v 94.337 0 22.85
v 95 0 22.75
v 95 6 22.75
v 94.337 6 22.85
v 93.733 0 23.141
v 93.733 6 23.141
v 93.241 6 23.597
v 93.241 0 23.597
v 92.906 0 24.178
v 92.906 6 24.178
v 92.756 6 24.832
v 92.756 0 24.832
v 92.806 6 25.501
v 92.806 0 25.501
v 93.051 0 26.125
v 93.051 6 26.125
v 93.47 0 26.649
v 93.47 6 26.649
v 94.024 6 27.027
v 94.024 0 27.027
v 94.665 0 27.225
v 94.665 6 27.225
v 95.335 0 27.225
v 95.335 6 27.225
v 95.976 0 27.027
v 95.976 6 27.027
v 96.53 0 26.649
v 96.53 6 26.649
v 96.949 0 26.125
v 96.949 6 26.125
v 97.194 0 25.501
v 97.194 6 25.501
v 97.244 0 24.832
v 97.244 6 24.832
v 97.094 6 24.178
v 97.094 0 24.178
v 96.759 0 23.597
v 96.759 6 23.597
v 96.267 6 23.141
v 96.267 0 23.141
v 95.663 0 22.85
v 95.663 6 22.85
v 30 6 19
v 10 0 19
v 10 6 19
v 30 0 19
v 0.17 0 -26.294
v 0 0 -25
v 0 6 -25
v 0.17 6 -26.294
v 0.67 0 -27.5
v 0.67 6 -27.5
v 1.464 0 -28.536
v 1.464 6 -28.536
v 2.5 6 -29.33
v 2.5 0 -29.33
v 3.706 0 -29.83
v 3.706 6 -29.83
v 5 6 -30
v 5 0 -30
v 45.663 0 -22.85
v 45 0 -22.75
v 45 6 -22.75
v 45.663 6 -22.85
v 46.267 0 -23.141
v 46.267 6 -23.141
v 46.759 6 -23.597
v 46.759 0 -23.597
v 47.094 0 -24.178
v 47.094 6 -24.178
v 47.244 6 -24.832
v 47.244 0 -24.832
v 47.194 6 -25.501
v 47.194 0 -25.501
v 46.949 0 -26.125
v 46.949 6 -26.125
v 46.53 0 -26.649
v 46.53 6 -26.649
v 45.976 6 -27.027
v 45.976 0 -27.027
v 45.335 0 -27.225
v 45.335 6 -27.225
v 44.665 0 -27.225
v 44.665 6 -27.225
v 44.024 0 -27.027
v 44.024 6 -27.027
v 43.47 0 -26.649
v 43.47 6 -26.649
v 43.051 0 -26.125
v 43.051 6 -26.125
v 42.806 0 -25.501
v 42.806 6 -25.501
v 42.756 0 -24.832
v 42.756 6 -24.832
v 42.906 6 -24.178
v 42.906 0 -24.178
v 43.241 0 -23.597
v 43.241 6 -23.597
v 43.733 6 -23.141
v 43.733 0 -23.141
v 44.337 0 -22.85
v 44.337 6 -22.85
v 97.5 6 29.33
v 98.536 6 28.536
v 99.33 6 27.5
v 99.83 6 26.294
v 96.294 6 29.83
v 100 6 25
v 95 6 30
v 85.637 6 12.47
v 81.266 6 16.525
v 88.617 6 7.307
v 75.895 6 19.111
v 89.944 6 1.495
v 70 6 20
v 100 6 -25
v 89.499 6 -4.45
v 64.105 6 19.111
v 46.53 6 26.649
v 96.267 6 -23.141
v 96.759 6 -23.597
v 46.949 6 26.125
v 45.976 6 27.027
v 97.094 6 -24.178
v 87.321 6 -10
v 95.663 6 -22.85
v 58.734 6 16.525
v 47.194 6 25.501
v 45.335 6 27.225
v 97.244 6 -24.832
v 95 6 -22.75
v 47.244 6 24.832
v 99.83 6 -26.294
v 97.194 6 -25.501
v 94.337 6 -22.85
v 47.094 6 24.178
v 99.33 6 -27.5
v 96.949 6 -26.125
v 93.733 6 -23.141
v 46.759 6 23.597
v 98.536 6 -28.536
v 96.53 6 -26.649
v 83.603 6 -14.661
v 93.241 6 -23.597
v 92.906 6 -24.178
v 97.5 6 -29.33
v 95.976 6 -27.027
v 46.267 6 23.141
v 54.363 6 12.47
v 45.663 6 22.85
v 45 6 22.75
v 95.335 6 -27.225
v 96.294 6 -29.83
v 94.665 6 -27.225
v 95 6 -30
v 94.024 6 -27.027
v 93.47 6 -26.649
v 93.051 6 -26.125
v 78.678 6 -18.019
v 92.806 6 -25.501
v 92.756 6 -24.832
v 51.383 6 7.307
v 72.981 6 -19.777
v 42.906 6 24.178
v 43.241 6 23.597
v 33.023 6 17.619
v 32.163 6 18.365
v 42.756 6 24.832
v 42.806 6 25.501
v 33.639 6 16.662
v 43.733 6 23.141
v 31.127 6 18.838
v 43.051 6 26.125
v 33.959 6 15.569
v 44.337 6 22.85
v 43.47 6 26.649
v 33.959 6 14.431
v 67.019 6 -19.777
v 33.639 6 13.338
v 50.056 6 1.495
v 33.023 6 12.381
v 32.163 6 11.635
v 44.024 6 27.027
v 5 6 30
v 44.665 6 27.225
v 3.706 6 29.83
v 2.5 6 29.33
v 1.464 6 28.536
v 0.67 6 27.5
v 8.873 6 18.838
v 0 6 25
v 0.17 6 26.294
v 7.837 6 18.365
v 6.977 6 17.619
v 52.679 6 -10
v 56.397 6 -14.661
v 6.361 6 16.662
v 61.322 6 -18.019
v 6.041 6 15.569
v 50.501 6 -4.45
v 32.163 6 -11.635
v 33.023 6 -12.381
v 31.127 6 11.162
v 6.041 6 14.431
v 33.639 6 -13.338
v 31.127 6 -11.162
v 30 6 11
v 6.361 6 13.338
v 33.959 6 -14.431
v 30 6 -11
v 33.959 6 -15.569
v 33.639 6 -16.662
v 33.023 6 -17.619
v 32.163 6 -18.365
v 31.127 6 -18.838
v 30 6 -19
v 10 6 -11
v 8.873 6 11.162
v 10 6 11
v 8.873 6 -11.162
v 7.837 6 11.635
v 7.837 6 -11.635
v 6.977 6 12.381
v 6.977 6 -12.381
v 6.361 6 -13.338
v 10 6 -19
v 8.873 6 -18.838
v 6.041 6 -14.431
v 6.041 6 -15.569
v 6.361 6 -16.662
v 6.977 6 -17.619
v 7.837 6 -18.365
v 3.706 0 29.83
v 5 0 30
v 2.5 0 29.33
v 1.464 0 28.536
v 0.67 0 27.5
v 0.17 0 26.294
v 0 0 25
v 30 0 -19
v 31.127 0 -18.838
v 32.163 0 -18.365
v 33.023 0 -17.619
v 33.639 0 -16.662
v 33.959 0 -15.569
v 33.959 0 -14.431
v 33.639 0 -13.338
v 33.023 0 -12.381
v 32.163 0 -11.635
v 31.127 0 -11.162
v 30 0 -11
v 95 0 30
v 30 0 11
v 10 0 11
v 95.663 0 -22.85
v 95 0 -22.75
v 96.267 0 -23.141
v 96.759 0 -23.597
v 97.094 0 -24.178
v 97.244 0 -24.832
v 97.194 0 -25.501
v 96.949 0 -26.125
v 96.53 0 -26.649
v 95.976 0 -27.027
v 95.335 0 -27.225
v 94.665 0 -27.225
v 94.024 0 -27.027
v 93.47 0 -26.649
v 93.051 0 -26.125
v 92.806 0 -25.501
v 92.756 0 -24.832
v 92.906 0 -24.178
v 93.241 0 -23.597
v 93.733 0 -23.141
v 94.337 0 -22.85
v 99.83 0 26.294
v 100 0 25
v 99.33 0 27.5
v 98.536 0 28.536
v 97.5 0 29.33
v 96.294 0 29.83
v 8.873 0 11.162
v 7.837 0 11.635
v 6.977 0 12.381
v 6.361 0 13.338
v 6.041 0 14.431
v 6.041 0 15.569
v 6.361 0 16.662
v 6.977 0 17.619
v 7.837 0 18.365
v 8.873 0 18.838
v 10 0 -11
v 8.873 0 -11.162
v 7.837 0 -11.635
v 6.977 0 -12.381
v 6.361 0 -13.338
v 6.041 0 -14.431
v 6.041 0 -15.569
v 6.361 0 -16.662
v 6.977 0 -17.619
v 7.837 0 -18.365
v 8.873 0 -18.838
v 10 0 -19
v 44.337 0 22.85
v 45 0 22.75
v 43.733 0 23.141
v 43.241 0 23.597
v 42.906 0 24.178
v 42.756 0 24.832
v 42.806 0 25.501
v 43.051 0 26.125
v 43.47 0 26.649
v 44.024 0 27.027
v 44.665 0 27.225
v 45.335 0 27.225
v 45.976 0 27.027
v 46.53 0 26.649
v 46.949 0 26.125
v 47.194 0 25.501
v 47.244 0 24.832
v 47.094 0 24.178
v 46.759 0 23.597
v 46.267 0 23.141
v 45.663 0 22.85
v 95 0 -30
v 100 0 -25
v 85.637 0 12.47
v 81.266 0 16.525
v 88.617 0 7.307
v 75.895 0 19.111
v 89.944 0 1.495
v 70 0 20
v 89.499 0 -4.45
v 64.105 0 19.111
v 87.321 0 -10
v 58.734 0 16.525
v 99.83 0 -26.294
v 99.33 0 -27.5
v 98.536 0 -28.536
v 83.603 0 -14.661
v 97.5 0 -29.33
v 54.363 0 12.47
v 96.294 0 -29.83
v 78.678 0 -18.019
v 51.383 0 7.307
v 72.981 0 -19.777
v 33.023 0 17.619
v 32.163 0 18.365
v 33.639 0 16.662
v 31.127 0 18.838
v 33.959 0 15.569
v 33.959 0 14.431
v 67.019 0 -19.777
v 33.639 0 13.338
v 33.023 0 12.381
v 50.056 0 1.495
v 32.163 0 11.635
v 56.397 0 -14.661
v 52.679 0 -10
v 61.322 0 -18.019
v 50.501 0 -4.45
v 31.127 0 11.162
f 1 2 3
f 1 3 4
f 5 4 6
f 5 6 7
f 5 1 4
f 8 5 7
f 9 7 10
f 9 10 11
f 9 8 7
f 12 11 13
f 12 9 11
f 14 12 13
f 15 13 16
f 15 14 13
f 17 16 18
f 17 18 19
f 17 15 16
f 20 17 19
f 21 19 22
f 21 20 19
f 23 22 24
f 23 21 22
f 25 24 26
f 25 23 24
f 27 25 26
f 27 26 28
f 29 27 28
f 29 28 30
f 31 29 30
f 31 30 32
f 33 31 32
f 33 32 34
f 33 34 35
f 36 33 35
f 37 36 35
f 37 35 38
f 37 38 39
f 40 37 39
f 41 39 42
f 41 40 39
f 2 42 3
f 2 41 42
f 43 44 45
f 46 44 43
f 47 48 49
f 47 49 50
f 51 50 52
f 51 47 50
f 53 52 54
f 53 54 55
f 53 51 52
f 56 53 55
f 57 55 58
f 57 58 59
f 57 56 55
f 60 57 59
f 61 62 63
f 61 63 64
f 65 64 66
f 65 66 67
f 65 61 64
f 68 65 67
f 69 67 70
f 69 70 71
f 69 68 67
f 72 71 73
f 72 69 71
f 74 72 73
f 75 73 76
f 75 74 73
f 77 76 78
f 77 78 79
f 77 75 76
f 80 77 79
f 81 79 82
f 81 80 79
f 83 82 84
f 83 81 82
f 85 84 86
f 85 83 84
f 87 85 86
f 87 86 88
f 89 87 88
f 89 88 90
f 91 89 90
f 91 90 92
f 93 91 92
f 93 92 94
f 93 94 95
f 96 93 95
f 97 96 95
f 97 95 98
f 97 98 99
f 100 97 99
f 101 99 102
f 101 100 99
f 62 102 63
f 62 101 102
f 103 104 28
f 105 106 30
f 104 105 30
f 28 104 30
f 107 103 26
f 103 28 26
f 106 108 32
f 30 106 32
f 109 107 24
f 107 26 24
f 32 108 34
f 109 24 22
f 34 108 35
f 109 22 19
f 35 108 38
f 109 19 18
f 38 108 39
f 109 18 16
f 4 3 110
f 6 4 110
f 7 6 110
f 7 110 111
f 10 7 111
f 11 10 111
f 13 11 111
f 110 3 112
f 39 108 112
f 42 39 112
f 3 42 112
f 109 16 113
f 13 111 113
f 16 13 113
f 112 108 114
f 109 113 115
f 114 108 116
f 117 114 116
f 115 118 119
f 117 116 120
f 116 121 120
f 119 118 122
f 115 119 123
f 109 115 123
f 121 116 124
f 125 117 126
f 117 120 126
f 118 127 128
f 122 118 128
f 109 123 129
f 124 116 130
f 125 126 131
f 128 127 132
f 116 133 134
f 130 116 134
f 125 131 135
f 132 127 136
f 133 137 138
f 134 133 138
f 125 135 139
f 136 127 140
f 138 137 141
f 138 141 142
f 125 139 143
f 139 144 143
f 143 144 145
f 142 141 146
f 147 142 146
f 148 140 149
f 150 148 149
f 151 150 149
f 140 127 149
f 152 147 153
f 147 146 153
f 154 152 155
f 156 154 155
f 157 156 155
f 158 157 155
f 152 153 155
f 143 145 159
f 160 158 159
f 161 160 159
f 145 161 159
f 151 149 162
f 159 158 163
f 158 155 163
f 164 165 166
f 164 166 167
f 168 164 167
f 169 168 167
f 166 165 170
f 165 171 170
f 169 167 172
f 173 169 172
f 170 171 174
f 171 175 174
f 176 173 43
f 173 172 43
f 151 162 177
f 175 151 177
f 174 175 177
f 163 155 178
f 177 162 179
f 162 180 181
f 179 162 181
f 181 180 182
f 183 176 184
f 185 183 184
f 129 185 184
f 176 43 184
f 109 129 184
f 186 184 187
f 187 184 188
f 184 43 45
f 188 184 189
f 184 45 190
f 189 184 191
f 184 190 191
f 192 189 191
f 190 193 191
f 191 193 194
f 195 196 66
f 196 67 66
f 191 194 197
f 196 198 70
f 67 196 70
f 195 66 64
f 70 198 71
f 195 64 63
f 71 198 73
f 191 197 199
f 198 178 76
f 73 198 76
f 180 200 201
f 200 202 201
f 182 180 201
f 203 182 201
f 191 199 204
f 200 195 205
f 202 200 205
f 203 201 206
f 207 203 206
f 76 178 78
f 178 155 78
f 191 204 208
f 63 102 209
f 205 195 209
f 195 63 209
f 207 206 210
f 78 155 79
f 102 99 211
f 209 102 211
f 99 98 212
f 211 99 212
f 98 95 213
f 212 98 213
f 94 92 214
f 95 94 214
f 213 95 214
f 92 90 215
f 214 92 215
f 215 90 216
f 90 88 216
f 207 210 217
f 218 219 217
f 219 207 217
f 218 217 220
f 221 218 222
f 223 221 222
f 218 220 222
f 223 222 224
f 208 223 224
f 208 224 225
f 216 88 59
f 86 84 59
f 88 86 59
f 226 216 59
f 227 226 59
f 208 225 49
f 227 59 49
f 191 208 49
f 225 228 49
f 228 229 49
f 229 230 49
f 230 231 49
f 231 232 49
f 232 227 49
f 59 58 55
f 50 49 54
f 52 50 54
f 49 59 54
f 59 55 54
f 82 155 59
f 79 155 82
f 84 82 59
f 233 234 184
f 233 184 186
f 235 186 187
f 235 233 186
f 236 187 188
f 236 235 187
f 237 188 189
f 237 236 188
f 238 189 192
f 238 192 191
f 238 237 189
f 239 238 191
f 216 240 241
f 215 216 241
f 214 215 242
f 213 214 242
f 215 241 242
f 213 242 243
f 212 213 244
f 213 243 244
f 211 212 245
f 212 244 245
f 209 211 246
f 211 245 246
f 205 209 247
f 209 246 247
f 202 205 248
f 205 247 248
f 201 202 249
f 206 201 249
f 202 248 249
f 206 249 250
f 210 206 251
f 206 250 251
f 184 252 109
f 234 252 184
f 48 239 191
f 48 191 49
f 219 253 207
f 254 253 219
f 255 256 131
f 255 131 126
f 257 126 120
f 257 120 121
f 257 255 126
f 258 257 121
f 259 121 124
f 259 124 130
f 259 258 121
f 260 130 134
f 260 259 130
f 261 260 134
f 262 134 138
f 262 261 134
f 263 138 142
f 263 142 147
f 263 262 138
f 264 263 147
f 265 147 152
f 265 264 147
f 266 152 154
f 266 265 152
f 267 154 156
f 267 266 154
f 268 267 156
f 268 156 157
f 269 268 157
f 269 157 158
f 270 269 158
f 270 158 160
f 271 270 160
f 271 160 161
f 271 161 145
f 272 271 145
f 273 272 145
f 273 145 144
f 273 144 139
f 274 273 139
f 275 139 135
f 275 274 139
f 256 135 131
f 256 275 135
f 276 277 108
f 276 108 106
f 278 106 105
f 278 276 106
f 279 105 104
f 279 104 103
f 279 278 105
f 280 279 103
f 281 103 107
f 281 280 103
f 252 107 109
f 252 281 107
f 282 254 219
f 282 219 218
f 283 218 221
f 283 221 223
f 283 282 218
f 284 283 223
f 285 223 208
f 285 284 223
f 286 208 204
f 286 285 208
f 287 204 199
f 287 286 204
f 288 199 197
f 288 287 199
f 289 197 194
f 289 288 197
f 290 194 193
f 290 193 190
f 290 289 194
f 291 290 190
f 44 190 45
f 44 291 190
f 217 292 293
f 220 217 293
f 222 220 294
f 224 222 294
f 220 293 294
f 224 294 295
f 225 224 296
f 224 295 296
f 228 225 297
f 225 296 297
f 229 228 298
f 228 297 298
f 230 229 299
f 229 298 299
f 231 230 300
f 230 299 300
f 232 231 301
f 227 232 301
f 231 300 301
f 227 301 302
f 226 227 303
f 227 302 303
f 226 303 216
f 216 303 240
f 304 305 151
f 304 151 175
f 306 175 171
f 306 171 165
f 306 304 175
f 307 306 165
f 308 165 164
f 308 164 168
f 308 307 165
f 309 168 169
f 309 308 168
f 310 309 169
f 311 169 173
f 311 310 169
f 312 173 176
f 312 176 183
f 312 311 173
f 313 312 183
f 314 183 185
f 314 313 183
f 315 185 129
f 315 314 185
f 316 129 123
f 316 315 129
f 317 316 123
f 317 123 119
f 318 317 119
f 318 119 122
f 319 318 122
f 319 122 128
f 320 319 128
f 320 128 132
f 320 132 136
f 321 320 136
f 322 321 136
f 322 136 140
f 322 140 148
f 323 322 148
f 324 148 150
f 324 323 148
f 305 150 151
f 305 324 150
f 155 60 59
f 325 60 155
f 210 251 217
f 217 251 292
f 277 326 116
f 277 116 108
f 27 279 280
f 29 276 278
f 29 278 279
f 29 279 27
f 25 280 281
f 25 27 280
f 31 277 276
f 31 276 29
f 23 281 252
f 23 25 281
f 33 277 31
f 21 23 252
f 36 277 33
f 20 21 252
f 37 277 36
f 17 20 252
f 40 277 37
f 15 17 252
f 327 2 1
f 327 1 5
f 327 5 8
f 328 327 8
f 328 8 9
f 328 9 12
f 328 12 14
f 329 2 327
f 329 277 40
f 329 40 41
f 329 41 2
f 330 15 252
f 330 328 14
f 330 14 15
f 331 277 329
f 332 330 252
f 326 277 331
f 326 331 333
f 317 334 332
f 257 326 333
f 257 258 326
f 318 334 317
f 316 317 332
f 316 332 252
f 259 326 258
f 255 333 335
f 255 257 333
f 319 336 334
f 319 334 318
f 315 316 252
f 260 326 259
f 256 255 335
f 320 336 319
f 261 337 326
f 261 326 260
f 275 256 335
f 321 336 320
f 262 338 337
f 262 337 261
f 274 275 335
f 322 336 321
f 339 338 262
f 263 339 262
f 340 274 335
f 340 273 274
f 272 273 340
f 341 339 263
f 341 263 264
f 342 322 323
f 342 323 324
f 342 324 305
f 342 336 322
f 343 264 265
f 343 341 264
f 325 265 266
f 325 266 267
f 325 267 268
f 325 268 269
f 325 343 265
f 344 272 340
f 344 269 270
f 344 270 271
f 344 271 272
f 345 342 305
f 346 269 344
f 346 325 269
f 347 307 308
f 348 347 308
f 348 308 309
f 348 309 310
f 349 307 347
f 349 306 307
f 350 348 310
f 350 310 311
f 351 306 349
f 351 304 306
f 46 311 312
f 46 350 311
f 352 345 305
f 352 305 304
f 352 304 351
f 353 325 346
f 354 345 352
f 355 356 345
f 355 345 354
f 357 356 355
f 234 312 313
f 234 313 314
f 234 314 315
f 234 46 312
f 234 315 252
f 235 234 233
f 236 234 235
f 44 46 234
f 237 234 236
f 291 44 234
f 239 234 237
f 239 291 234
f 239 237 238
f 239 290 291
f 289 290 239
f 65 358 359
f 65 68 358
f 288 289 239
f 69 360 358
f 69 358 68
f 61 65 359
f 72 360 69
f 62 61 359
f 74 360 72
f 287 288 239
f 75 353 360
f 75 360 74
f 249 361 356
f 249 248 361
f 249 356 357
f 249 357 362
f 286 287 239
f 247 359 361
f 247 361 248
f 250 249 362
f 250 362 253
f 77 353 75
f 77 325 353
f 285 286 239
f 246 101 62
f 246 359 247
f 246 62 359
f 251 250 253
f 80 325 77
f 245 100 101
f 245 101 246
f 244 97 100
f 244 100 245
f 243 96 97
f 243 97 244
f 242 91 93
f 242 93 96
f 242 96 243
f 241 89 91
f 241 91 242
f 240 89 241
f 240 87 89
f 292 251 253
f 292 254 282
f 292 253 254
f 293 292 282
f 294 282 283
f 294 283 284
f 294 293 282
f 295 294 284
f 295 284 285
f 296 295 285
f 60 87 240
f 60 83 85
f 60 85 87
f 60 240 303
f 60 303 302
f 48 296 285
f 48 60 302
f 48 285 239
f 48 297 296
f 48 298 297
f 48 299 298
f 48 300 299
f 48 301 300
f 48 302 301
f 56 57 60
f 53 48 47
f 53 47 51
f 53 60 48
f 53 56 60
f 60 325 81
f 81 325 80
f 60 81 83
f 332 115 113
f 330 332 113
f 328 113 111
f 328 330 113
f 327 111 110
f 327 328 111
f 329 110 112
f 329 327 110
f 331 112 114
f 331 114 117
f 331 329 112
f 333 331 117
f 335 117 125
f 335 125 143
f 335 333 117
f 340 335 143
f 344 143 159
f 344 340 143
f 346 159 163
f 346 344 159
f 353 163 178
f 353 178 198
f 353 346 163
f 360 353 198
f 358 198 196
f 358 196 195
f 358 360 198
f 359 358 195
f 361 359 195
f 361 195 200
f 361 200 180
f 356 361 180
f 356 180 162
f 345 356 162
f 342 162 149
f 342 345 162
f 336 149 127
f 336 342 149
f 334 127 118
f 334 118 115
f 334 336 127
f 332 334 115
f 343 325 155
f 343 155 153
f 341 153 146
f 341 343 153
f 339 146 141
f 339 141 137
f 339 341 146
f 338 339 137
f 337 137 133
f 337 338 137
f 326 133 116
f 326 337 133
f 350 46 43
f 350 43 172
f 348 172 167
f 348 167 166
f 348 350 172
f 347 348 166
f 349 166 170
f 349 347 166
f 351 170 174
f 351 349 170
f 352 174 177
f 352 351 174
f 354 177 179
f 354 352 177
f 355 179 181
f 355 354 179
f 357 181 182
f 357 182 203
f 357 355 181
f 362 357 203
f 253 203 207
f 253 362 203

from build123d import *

# Parameters (mm, degrees)
SKETCH1_R           = 2.25
SKETCH1_R_2         = 20
BOSS_EXTRUDE1_DEPTH = 6


with BuildPart() as part:
    # Sketch1 → Boss-Extrude1 (new body)
    with BuildSketch(Plane(origin=(0, 0, 0), x_dir=(1, 0, 0), z_dir=(0, 1, 0))):
        with BuildLine():
            Line((0, -25), (0, 25))
            ThreePointArc((0, 25), (1.464466094, 28.535533906), (5, 30))
            Line((5, 30), (95, 30))
            ThreePointArc((95, 30), (98.535533906, 28.535533906), (100, 25))
            Line((100, 25), (100, -25))
            ThreePointArc((100, -25), (98.535533906, -28.535533906), (95, -30))
            Line((95, -30), (5, -30))
            ThreePointArc((5, -30), (1.464466094, -28.535533906), (0, -25))
        make_face()
        with Locations(Location((95, 25, 0), (0, 0, 270))):
            Circle(SKETCH1_R, mode=Mode.SUBTRACT)
        with Locations(Location((45, 25, 0), (0, 0, 270))):
            Circle(SKETCH1_R, mode=Mode.SUBTRACT)
        with Locations(Location((45, -25, 0), (0, 0, 90))):
            Circle(SKETCH1_R, mode=Mode.SUBTRACT)
        with Locations(Location((95, -25, 0), (0, 0, 90))):
            Circle(SKETCH1_R, mode=Mode.SUBTRACT)
        with Locations(Location((70, 0, 0), (0, 0, 270))):
            Circle(SKETCH1_R_2, mode=Mode.SUBTRACT)
        with BuildLine():
            Line((10, 19), (30, 19))
            ThreePointArc((30, 19), (34, 15), (30, 11))
            Line((30, 11), (10, 11))
            ThreePointArc((10, 11), (6, 15), (10, 19))
        make_face(mode=Mode.SUBTRACT)
        with BuildLine():
            Line((10, -19), (30, -19))
            ThreePointArc((30, -19), (34, -15), (30, -11))
            Line((30, -11), (10, -11))
            ThreePointArc((10, -11), (6, -15), (10, -19))
        make_face(mode=Mode.SUBTRACT)
    extrude(amount=BOSS_EXTRUDE1_DEPTH)


solid = part.part
